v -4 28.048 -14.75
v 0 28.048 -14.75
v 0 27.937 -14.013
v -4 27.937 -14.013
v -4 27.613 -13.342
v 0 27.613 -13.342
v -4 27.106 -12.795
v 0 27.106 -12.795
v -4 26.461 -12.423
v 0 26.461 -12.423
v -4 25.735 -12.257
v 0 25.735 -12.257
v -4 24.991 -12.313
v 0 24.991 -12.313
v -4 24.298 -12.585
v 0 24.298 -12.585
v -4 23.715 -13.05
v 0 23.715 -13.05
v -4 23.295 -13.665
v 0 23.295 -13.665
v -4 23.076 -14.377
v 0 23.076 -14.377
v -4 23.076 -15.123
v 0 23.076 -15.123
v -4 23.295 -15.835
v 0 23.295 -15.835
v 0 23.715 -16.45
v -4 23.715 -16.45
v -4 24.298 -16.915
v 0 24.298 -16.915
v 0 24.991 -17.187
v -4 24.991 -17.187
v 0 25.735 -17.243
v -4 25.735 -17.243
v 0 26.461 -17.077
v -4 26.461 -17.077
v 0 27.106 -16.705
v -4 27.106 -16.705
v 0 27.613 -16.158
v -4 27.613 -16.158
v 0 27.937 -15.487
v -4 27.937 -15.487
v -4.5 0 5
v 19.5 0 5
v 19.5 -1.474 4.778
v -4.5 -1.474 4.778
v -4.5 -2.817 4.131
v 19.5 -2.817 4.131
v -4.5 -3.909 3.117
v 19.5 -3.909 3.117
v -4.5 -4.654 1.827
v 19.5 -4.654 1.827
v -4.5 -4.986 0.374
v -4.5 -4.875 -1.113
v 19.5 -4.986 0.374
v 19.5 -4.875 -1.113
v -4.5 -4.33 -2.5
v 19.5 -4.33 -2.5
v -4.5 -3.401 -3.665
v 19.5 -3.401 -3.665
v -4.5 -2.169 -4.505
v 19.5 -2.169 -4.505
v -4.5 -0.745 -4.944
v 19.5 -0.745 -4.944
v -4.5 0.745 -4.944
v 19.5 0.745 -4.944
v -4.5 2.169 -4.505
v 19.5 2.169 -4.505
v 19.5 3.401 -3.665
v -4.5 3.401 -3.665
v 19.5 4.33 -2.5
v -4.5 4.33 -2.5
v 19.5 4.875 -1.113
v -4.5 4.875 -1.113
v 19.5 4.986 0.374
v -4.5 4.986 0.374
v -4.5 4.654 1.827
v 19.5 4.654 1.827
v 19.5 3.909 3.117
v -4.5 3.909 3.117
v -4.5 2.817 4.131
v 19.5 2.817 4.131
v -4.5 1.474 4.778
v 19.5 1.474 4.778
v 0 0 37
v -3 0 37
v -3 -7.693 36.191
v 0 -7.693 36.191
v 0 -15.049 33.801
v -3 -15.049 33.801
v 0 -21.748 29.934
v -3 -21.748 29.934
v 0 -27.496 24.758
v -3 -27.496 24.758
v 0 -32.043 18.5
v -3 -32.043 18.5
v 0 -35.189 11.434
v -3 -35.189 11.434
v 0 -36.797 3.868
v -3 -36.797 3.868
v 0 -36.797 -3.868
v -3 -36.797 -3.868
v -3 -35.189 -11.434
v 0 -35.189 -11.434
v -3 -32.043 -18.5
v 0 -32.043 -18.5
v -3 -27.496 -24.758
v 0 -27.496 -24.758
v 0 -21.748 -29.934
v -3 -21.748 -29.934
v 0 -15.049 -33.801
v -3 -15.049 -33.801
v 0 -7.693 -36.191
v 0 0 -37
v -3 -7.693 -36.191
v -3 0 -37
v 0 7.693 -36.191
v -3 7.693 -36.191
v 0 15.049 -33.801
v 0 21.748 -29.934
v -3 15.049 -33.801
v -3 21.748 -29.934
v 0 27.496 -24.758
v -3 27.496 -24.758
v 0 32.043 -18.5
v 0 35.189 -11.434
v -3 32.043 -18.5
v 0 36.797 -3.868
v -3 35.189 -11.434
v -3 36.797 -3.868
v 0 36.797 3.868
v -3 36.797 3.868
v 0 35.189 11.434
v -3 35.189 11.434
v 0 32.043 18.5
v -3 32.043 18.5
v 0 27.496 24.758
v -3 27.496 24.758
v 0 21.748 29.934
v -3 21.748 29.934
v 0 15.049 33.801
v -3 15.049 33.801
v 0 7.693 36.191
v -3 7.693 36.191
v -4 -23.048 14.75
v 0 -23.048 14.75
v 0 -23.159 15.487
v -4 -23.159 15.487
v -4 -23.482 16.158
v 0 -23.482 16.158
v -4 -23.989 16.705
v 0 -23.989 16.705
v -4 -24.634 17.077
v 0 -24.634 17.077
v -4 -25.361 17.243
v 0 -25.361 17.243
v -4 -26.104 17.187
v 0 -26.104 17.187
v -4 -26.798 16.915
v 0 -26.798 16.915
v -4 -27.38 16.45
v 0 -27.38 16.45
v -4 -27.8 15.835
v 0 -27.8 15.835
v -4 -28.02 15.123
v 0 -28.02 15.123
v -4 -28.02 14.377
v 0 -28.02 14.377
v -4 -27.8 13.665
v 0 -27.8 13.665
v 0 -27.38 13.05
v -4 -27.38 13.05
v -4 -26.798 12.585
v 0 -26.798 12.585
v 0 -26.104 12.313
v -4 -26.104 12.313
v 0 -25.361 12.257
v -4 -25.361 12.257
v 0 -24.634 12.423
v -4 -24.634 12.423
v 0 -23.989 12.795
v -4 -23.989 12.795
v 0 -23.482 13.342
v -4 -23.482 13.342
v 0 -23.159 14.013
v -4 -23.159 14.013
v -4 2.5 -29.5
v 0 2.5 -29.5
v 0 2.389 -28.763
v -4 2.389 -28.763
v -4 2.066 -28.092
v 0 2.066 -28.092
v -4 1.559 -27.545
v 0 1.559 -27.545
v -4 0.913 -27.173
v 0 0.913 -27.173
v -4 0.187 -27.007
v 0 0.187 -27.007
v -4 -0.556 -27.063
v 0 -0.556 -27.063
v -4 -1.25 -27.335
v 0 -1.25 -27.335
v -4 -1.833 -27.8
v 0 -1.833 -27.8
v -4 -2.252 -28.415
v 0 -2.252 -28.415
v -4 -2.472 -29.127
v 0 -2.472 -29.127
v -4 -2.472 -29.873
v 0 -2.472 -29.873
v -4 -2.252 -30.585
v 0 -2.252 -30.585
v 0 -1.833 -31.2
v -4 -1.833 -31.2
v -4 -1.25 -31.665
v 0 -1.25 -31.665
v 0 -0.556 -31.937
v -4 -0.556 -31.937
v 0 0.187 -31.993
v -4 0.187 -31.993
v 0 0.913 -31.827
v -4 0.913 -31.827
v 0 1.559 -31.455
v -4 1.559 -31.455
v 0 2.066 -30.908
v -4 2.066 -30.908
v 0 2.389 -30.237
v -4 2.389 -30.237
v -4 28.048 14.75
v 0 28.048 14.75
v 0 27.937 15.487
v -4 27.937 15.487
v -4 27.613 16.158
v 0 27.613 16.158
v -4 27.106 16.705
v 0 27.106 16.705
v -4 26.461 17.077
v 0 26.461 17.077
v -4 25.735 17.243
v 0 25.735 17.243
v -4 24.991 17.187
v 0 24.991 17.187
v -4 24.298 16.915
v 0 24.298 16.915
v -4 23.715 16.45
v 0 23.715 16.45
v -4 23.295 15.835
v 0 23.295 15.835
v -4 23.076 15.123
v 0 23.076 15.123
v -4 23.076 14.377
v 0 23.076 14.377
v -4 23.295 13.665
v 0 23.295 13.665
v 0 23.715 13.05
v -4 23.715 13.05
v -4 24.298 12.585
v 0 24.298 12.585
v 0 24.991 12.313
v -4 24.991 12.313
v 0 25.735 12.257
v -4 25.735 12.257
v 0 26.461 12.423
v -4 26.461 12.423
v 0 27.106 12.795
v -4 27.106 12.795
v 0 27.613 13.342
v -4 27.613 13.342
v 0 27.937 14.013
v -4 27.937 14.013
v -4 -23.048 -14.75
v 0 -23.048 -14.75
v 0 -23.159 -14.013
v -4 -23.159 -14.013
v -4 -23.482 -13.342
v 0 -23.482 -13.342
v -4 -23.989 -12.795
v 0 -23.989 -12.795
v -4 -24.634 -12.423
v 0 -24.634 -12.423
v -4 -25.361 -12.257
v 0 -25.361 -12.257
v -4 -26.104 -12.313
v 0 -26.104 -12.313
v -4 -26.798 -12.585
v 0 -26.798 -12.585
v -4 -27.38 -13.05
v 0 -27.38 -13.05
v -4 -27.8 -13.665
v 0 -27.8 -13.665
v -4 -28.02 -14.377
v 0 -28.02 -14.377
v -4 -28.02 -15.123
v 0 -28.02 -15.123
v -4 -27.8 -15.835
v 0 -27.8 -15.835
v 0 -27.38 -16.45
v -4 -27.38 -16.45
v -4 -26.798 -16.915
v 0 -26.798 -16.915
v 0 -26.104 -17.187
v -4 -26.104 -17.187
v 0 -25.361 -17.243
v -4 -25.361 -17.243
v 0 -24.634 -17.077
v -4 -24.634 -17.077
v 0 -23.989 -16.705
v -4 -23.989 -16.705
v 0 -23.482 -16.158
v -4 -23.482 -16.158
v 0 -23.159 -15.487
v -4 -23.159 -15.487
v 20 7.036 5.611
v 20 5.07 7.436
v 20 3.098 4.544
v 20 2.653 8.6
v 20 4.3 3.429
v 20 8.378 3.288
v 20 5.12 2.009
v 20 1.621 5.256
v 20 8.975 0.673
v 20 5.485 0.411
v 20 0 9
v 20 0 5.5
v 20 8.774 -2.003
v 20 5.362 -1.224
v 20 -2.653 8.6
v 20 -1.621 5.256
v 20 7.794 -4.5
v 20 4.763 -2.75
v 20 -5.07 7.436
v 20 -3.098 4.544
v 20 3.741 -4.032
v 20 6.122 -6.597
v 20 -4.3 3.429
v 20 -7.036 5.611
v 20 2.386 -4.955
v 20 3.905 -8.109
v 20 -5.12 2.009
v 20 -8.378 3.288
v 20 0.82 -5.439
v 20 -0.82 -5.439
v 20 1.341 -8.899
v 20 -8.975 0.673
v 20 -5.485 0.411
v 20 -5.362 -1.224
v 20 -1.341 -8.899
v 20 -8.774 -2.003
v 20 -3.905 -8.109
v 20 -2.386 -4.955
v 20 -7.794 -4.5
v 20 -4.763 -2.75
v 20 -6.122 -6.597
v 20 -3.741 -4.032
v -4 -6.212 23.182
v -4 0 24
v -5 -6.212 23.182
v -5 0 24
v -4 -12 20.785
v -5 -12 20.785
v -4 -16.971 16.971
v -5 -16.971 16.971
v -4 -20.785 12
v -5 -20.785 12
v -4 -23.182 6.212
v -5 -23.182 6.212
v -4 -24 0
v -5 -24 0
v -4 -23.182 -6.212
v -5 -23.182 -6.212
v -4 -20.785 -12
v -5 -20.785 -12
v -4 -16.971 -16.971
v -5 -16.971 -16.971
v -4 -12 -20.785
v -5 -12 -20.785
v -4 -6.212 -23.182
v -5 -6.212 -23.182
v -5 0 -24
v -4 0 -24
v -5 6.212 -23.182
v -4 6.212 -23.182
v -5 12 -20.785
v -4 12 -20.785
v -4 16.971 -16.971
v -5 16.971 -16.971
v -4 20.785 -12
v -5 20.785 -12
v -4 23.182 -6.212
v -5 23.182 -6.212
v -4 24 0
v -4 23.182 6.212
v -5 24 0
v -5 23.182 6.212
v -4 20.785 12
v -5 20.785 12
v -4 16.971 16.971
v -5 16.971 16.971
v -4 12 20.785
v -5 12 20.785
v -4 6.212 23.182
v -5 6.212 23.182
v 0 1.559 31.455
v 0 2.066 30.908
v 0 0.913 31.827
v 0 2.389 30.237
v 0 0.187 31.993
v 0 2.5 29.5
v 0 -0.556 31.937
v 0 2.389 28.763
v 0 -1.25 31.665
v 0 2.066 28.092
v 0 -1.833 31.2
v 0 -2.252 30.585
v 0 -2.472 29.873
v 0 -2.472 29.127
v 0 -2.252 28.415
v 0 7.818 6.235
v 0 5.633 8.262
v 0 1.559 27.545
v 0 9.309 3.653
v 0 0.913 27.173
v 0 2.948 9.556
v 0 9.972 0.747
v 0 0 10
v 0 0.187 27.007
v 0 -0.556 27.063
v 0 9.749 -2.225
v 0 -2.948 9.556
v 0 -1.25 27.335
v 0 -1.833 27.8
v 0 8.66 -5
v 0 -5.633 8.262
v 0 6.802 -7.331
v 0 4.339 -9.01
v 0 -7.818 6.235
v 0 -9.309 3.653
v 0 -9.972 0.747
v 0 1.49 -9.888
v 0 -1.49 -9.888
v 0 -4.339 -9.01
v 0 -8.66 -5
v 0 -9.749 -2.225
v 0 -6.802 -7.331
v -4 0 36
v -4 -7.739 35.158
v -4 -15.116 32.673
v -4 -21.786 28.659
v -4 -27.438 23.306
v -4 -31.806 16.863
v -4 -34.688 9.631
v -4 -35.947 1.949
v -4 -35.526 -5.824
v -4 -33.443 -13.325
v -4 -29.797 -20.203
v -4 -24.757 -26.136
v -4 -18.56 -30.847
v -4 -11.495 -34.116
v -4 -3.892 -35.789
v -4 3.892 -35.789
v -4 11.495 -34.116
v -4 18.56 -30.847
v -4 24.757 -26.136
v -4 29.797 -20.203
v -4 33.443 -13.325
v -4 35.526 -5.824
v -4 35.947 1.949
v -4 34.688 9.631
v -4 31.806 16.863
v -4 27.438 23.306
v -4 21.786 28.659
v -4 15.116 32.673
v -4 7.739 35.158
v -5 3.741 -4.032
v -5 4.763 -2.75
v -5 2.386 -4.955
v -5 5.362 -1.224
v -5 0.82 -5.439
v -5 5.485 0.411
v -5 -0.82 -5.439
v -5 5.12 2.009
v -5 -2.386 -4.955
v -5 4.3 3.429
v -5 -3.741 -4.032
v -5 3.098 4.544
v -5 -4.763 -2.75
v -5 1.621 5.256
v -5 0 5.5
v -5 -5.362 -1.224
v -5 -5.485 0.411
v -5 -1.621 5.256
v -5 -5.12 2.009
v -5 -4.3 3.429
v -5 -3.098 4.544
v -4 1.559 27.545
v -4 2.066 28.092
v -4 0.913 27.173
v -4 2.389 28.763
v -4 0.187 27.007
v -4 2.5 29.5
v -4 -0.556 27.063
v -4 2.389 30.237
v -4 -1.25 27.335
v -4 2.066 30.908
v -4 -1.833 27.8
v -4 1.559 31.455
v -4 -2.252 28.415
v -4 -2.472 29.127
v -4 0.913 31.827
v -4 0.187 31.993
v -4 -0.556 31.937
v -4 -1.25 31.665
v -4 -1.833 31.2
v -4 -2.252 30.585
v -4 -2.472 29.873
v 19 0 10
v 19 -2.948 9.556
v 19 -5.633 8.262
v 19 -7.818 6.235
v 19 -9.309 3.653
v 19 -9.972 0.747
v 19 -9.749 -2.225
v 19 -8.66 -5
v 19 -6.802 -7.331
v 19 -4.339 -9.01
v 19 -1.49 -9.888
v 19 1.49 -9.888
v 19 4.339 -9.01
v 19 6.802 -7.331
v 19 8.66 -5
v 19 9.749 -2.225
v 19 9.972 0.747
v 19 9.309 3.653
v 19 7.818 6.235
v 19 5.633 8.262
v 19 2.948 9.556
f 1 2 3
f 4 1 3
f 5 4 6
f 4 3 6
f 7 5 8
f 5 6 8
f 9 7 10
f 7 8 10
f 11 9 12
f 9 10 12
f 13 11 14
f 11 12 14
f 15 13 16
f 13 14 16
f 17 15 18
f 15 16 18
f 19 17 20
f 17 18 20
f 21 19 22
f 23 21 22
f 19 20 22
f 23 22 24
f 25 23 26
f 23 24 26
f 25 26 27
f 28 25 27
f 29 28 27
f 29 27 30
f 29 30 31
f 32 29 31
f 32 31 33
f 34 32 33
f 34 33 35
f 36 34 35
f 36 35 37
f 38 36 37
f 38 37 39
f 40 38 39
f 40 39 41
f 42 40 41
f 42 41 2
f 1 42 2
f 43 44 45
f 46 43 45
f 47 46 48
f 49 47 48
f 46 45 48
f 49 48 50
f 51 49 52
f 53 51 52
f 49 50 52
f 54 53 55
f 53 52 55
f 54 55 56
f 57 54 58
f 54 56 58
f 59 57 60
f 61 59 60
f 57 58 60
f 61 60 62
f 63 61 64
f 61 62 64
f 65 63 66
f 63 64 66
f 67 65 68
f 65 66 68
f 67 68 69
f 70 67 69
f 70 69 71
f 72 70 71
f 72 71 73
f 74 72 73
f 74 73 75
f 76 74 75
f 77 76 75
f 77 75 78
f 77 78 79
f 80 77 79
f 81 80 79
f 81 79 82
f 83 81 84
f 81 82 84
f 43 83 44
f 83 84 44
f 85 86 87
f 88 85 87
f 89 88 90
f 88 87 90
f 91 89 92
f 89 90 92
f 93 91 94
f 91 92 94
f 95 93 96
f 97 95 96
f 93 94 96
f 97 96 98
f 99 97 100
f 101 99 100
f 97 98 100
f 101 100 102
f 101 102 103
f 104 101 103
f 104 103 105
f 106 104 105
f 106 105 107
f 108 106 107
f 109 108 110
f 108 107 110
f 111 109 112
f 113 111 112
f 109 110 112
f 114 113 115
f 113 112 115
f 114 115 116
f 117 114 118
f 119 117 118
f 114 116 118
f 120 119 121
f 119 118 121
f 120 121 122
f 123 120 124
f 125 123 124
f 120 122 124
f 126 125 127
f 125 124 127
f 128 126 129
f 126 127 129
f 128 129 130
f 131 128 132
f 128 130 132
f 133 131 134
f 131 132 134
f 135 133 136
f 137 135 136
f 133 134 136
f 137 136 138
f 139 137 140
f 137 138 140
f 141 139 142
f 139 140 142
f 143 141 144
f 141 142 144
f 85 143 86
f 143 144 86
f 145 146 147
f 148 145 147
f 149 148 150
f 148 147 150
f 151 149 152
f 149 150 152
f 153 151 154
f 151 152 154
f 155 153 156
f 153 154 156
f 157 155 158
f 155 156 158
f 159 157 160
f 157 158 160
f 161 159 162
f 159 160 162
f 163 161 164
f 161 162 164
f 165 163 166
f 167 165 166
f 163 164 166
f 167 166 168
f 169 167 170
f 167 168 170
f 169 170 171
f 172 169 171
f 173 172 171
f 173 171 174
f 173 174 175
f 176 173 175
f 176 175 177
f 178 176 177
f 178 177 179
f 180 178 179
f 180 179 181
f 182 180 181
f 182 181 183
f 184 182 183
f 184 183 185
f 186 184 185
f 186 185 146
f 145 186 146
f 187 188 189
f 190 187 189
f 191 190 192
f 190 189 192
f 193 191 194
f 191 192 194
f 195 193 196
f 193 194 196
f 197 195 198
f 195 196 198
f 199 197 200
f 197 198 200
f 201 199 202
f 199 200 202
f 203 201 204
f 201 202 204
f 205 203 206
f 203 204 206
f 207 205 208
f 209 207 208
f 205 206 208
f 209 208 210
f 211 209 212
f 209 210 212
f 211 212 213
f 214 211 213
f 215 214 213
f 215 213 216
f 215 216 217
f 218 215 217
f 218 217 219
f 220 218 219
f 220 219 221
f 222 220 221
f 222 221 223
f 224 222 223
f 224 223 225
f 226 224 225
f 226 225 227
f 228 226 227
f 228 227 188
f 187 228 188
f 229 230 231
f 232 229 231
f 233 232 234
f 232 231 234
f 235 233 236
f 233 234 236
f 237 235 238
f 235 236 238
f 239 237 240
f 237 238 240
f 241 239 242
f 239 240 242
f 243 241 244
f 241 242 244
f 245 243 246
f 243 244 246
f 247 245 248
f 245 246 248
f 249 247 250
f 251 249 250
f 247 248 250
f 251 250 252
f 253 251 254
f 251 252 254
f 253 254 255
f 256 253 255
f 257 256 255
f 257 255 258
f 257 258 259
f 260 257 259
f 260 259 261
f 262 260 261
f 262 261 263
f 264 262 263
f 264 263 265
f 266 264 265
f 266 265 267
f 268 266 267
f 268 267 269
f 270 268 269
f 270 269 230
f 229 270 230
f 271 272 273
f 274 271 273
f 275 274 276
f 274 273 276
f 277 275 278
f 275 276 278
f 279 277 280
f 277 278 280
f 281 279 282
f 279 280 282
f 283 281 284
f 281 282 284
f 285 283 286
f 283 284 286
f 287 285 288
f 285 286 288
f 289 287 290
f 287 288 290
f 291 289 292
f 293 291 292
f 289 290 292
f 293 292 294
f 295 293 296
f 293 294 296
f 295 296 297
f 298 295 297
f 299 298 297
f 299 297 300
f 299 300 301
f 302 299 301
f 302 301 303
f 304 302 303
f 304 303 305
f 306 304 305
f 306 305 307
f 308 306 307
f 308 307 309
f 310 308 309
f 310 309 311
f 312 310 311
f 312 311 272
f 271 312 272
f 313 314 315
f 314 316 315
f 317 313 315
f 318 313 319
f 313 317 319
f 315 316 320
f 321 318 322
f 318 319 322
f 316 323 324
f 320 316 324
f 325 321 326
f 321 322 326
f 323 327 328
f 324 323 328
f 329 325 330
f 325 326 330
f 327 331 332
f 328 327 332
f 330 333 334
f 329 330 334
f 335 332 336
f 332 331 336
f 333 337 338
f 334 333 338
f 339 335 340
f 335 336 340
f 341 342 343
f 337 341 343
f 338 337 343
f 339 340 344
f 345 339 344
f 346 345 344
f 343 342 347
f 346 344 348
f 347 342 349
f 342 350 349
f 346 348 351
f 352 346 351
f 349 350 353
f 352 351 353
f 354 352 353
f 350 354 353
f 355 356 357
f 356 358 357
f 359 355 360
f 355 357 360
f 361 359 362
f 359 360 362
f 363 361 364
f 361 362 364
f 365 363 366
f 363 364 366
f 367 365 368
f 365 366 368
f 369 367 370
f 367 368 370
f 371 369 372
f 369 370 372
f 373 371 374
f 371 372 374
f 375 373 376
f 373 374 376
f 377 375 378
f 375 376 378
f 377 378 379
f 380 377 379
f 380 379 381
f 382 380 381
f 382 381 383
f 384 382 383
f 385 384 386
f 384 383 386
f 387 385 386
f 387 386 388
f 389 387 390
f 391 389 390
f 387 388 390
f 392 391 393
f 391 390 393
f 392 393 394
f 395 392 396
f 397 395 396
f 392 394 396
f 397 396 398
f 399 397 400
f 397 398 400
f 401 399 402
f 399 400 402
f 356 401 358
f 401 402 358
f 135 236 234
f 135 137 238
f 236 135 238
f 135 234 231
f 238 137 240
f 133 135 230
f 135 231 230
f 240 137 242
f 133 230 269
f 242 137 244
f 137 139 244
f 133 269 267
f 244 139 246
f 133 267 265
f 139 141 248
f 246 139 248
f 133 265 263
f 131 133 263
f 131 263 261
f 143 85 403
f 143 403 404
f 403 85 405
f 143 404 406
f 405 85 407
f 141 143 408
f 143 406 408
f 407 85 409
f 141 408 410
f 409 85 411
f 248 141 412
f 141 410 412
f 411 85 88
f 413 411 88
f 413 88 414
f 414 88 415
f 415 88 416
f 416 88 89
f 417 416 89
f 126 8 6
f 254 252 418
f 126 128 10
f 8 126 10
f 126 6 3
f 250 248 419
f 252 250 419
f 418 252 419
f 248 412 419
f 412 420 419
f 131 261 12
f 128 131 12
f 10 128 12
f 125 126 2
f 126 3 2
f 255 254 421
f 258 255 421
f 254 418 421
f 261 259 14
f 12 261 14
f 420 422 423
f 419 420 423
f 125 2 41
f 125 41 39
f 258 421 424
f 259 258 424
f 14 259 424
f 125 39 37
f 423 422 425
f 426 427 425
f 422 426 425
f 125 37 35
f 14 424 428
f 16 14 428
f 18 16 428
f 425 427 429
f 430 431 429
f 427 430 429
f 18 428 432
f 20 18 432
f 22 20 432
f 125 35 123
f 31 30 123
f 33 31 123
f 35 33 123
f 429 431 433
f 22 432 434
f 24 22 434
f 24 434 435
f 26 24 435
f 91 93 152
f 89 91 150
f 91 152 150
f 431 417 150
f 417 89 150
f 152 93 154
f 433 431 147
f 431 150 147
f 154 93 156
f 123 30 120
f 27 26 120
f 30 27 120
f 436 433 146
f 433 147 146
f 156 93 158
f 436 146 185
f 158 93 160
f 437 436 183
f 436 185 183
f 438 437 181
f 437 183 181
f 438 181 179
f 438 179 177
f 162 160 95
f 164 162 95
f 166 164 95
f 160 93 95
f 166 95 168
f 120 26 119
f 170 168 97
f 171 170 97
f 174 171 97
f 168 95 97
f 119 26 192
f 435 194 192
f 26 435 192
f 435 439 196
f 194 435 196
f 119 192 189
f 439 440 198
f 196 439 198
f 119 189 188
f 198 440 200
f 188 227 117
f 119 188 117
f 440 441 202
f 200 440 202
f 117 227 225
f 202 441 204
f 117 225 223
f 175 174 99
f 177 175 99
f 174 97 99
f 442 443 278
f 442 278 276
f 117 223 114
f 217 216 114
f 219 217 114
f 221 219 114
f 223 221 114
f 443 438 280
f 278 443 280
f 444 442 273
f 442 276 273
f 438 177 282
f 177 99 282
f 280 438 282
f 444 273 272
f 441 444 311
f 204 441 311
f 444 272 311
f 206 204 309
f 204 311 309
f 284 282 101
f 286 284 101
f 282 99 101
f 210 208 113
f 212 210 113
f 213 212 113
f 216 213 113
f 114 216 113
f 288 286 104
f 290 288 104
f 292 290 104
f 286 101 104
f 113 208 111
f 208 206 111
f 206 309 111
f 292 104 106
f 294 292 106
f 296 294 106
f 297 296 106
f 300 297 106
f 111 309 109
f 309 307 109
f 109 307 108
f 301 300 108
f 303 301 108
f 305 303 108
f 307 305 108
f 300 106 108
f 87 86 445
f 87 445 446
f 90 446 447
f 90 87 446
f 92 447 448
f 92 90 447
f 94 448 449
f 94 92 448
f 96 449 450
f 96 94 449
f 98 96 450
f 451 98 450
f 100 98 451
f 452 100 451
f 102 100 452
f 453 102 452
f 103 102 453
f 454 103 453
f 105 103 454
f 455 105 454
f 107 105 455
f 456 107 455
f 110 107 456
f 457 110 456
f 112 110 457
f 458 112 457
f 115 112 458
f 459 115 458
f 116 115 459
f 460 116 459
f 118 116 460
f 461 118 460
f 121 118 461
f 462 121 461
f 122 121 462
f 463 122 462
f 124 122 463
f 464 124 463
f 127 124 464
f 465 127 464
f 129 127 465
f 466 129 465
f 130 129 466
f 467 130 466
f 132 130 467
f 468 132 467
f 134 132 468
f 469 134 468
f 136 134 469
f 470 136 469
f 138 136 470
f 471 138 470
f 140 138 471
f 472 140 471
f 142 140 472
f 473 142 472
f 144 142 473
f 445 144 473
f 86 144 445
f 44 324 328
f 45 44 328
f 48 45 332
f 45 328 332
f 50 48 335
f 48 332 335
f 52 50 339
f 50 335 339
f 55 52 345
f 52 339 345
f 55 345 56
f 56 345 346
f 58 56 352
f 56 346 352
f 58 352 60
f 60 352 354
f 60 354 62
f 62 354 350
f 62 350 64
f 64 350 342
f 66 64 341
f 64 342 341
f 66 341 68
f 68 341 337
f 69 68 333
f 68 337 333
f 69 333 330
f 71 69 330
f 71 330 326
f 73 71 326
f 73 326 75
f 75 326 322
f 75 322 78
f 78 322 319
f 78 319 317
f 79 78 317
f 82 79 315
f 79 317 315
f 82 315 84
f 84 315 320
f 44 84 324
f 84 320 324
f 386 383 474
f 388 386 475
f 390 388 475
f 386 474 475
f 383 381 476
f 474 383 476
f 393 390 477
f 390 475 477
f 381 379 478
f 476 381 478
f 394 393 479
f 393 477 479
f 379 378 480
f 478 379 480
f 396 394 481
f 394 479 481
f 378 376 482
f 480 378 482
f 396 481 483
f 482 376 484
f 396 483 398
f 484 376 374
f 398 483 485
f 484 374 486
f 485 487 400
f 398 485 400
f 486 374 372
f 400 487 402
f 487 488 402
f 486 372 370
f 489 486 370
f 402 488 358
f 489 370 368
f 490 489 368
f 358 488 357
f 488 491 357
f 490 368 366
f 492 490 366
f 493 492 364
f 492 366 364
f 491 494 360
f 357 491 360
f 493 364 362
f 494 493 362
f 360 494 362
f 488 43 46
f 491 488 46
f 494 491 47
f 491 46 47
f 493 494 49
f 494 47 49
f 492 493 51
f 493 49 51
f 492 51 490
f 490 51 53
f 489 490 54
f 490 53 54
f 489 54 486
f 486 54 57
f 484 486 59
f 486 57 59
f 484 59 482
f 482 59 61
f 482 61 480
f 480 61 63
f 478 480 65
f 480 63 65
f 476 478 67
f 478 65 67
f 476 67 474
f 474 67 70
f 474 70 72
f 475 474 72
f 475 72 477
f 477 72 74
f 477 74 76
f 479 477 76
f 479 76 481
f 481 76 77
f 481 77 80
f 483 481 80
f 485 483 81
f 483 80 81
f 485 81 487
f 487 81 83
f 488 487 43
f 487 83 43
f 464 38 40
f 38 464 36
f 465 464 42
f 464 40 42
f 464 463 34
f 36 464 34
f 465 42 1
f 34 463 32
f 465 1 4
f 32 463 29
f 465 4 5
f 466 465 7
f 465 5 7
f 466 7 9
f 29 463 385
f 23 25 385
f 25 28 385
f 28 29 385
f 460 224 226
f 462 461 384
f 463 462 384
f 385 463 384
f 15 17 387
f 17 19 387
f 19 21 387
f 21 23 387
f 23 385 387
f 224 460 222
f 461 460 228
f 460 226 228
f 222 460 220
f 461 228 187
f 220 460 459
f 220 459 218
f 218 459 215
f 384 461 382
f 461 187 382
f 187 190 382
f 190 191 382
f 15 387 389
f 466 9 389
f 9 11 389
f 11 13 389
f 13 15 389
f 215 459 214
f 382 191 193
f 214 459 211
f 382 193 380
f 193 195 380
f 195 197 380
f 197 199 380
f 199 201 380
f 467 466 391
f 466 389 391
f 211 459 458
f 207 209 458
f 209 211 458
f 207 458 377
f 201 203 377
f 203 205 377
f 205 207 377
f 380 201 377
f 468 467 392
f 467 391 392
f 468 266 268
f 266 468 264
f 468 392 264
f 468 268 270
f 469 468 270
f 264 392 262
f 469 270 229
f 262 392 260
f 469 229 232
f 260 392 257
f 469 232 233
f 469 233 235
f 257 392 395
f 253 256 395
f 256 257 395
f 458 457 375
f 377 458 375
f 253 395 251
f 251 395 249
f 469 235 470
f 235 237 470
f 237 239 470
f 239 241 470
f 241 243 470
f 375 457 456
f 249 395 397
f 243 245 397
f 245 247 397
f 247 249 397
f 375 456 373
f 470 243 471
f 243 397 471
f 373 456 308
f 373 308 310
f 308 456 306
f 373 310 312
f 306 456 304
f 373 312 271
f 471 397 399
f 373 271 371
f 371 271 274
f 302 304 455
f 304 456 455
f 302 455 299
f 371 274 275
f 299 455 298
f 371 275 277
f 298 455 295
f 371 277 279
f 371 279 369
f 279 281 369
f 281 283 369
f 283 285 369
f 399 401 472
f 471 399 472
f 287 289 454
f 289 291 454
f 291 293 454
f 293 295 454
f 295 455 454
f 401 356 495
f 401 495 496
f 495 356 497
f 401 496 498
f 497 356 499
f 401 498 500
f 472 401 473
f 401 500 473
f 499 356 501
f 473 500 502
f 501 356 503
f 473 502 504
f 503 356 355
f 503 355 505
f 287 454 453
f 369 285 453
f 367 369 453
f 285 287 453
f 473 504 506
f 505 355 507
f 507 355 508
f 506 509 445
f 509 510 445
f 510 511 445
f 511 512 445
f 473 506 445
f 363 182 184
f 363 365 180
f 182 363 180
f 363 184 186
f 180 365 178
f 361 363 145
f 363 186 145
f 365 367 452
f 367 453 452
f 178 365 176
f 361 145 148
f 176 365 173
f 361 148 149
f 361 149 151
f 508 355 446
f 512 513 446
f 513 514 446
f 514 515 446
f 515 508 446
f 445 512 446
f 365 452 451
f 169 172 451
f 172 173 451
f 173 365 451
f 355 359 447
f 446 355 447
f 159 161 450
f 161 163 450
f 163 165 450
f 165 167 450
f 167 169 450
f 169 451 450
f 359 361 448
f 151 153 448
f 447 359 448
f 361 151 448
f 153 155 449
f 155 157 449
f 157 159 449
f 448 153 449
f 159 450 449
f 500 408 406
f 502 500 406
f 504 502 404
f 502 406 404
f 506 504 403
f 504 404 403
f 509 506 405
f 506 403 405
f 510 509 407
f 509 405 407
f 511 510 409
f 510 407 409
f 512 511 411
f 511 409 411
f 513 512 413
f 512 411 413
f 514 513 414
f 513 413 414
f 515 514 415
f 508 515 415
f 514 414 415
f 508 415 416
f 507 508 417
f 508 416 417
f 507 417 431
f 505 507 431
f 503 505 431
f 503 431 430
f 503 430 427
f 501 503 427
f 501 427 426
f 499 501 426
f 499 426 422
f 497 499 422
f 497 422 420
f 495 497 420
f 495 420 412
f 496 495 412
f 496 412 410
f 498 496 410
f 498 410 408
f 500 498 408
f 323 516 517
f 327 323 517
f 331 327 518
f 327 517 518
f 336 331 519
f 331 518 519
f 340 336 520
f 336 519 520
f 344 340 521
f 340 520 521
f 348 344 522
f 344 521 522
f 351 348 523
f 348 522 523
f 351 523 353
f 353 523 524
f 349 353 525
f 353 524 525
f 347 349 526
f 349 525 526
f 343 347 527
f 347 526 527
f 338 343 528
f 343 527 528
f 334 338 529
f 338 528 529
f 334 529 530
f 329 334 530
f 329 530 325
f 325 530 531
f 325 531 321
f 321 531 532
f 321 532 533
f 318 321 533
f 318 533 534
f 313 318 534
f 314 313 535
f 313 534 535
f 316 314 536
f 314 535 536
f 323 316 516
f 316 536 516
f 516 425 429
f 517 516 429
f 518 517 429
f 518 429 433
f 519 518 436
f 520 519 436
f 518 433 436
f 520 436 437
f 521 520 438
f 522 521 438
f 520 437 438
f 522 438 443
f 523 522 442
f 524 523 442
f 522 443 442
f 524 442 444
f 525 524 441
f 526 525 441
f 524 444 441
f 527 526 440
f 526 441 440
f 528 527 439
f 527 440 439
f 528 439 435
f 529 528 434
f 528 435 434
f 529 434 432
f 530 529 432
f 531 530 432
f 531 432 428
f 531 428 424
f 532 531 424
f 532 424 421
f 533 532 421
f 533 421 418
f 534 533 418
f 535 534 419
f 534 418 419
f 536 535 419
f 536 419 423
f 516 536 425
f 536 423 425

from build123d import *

# Parameters (mm, degrees)
F2_R     = 2.5
F3_DEPTH = 5.001
F4_SIZE  = 1
F5_SIZE  = 0.5


with BuildPart() as f1:
    # F0 (on Front) → F1 (revolve)
    with BuildSketch(Plane.XZ):
        Polygon((-5, 24), (-5, 5), (0, 5), (20, 5), (20, 10), (0, 10), (0, 37), (-4, 37), (-4, 24), align=None)
    revolve(axis=Axis((1.734695, 0, 0), (1, 0, 0)))

    # F2 (on face) → F3 (cut, through all)
    with BuildSketch(Plane.YZ):
        with Locations((0, 29.5)):
            Circle(F2_R)
        with Locations((-25.547749, 14.75)):
            Circle(F2_R)
        with Locations((-25.547749, -14.75)):
            Circle(F2_R)
        with Locations((0, -29.5)):
            Circle(F2_R)
        with Locations((25.547749, -14.75)):
            Circle(F2_R)
        with Locations((25.547749, 14.75)):
            Circle(F2_R)
    extrude(amount=-F3_DEPTH, mode=Mode.SUBTRACT)

    # F4
    f4_edges = [f1.edges().sort_by_distance(p)[0] for p in [
        (20, 0, -10),
        (-4, 0, -37),
    ]]
    chamfer(f4_edges, length=F4_SIZE)

    # F5
    f5_edges = [f1.edges().sort_by_distance(p)[0] for p in [
        (-5, 0, -5),
        (20, 0, -5),
    ]]
    chamfer(f5_edges, length=F5_SIZE)


solid = f1.part
